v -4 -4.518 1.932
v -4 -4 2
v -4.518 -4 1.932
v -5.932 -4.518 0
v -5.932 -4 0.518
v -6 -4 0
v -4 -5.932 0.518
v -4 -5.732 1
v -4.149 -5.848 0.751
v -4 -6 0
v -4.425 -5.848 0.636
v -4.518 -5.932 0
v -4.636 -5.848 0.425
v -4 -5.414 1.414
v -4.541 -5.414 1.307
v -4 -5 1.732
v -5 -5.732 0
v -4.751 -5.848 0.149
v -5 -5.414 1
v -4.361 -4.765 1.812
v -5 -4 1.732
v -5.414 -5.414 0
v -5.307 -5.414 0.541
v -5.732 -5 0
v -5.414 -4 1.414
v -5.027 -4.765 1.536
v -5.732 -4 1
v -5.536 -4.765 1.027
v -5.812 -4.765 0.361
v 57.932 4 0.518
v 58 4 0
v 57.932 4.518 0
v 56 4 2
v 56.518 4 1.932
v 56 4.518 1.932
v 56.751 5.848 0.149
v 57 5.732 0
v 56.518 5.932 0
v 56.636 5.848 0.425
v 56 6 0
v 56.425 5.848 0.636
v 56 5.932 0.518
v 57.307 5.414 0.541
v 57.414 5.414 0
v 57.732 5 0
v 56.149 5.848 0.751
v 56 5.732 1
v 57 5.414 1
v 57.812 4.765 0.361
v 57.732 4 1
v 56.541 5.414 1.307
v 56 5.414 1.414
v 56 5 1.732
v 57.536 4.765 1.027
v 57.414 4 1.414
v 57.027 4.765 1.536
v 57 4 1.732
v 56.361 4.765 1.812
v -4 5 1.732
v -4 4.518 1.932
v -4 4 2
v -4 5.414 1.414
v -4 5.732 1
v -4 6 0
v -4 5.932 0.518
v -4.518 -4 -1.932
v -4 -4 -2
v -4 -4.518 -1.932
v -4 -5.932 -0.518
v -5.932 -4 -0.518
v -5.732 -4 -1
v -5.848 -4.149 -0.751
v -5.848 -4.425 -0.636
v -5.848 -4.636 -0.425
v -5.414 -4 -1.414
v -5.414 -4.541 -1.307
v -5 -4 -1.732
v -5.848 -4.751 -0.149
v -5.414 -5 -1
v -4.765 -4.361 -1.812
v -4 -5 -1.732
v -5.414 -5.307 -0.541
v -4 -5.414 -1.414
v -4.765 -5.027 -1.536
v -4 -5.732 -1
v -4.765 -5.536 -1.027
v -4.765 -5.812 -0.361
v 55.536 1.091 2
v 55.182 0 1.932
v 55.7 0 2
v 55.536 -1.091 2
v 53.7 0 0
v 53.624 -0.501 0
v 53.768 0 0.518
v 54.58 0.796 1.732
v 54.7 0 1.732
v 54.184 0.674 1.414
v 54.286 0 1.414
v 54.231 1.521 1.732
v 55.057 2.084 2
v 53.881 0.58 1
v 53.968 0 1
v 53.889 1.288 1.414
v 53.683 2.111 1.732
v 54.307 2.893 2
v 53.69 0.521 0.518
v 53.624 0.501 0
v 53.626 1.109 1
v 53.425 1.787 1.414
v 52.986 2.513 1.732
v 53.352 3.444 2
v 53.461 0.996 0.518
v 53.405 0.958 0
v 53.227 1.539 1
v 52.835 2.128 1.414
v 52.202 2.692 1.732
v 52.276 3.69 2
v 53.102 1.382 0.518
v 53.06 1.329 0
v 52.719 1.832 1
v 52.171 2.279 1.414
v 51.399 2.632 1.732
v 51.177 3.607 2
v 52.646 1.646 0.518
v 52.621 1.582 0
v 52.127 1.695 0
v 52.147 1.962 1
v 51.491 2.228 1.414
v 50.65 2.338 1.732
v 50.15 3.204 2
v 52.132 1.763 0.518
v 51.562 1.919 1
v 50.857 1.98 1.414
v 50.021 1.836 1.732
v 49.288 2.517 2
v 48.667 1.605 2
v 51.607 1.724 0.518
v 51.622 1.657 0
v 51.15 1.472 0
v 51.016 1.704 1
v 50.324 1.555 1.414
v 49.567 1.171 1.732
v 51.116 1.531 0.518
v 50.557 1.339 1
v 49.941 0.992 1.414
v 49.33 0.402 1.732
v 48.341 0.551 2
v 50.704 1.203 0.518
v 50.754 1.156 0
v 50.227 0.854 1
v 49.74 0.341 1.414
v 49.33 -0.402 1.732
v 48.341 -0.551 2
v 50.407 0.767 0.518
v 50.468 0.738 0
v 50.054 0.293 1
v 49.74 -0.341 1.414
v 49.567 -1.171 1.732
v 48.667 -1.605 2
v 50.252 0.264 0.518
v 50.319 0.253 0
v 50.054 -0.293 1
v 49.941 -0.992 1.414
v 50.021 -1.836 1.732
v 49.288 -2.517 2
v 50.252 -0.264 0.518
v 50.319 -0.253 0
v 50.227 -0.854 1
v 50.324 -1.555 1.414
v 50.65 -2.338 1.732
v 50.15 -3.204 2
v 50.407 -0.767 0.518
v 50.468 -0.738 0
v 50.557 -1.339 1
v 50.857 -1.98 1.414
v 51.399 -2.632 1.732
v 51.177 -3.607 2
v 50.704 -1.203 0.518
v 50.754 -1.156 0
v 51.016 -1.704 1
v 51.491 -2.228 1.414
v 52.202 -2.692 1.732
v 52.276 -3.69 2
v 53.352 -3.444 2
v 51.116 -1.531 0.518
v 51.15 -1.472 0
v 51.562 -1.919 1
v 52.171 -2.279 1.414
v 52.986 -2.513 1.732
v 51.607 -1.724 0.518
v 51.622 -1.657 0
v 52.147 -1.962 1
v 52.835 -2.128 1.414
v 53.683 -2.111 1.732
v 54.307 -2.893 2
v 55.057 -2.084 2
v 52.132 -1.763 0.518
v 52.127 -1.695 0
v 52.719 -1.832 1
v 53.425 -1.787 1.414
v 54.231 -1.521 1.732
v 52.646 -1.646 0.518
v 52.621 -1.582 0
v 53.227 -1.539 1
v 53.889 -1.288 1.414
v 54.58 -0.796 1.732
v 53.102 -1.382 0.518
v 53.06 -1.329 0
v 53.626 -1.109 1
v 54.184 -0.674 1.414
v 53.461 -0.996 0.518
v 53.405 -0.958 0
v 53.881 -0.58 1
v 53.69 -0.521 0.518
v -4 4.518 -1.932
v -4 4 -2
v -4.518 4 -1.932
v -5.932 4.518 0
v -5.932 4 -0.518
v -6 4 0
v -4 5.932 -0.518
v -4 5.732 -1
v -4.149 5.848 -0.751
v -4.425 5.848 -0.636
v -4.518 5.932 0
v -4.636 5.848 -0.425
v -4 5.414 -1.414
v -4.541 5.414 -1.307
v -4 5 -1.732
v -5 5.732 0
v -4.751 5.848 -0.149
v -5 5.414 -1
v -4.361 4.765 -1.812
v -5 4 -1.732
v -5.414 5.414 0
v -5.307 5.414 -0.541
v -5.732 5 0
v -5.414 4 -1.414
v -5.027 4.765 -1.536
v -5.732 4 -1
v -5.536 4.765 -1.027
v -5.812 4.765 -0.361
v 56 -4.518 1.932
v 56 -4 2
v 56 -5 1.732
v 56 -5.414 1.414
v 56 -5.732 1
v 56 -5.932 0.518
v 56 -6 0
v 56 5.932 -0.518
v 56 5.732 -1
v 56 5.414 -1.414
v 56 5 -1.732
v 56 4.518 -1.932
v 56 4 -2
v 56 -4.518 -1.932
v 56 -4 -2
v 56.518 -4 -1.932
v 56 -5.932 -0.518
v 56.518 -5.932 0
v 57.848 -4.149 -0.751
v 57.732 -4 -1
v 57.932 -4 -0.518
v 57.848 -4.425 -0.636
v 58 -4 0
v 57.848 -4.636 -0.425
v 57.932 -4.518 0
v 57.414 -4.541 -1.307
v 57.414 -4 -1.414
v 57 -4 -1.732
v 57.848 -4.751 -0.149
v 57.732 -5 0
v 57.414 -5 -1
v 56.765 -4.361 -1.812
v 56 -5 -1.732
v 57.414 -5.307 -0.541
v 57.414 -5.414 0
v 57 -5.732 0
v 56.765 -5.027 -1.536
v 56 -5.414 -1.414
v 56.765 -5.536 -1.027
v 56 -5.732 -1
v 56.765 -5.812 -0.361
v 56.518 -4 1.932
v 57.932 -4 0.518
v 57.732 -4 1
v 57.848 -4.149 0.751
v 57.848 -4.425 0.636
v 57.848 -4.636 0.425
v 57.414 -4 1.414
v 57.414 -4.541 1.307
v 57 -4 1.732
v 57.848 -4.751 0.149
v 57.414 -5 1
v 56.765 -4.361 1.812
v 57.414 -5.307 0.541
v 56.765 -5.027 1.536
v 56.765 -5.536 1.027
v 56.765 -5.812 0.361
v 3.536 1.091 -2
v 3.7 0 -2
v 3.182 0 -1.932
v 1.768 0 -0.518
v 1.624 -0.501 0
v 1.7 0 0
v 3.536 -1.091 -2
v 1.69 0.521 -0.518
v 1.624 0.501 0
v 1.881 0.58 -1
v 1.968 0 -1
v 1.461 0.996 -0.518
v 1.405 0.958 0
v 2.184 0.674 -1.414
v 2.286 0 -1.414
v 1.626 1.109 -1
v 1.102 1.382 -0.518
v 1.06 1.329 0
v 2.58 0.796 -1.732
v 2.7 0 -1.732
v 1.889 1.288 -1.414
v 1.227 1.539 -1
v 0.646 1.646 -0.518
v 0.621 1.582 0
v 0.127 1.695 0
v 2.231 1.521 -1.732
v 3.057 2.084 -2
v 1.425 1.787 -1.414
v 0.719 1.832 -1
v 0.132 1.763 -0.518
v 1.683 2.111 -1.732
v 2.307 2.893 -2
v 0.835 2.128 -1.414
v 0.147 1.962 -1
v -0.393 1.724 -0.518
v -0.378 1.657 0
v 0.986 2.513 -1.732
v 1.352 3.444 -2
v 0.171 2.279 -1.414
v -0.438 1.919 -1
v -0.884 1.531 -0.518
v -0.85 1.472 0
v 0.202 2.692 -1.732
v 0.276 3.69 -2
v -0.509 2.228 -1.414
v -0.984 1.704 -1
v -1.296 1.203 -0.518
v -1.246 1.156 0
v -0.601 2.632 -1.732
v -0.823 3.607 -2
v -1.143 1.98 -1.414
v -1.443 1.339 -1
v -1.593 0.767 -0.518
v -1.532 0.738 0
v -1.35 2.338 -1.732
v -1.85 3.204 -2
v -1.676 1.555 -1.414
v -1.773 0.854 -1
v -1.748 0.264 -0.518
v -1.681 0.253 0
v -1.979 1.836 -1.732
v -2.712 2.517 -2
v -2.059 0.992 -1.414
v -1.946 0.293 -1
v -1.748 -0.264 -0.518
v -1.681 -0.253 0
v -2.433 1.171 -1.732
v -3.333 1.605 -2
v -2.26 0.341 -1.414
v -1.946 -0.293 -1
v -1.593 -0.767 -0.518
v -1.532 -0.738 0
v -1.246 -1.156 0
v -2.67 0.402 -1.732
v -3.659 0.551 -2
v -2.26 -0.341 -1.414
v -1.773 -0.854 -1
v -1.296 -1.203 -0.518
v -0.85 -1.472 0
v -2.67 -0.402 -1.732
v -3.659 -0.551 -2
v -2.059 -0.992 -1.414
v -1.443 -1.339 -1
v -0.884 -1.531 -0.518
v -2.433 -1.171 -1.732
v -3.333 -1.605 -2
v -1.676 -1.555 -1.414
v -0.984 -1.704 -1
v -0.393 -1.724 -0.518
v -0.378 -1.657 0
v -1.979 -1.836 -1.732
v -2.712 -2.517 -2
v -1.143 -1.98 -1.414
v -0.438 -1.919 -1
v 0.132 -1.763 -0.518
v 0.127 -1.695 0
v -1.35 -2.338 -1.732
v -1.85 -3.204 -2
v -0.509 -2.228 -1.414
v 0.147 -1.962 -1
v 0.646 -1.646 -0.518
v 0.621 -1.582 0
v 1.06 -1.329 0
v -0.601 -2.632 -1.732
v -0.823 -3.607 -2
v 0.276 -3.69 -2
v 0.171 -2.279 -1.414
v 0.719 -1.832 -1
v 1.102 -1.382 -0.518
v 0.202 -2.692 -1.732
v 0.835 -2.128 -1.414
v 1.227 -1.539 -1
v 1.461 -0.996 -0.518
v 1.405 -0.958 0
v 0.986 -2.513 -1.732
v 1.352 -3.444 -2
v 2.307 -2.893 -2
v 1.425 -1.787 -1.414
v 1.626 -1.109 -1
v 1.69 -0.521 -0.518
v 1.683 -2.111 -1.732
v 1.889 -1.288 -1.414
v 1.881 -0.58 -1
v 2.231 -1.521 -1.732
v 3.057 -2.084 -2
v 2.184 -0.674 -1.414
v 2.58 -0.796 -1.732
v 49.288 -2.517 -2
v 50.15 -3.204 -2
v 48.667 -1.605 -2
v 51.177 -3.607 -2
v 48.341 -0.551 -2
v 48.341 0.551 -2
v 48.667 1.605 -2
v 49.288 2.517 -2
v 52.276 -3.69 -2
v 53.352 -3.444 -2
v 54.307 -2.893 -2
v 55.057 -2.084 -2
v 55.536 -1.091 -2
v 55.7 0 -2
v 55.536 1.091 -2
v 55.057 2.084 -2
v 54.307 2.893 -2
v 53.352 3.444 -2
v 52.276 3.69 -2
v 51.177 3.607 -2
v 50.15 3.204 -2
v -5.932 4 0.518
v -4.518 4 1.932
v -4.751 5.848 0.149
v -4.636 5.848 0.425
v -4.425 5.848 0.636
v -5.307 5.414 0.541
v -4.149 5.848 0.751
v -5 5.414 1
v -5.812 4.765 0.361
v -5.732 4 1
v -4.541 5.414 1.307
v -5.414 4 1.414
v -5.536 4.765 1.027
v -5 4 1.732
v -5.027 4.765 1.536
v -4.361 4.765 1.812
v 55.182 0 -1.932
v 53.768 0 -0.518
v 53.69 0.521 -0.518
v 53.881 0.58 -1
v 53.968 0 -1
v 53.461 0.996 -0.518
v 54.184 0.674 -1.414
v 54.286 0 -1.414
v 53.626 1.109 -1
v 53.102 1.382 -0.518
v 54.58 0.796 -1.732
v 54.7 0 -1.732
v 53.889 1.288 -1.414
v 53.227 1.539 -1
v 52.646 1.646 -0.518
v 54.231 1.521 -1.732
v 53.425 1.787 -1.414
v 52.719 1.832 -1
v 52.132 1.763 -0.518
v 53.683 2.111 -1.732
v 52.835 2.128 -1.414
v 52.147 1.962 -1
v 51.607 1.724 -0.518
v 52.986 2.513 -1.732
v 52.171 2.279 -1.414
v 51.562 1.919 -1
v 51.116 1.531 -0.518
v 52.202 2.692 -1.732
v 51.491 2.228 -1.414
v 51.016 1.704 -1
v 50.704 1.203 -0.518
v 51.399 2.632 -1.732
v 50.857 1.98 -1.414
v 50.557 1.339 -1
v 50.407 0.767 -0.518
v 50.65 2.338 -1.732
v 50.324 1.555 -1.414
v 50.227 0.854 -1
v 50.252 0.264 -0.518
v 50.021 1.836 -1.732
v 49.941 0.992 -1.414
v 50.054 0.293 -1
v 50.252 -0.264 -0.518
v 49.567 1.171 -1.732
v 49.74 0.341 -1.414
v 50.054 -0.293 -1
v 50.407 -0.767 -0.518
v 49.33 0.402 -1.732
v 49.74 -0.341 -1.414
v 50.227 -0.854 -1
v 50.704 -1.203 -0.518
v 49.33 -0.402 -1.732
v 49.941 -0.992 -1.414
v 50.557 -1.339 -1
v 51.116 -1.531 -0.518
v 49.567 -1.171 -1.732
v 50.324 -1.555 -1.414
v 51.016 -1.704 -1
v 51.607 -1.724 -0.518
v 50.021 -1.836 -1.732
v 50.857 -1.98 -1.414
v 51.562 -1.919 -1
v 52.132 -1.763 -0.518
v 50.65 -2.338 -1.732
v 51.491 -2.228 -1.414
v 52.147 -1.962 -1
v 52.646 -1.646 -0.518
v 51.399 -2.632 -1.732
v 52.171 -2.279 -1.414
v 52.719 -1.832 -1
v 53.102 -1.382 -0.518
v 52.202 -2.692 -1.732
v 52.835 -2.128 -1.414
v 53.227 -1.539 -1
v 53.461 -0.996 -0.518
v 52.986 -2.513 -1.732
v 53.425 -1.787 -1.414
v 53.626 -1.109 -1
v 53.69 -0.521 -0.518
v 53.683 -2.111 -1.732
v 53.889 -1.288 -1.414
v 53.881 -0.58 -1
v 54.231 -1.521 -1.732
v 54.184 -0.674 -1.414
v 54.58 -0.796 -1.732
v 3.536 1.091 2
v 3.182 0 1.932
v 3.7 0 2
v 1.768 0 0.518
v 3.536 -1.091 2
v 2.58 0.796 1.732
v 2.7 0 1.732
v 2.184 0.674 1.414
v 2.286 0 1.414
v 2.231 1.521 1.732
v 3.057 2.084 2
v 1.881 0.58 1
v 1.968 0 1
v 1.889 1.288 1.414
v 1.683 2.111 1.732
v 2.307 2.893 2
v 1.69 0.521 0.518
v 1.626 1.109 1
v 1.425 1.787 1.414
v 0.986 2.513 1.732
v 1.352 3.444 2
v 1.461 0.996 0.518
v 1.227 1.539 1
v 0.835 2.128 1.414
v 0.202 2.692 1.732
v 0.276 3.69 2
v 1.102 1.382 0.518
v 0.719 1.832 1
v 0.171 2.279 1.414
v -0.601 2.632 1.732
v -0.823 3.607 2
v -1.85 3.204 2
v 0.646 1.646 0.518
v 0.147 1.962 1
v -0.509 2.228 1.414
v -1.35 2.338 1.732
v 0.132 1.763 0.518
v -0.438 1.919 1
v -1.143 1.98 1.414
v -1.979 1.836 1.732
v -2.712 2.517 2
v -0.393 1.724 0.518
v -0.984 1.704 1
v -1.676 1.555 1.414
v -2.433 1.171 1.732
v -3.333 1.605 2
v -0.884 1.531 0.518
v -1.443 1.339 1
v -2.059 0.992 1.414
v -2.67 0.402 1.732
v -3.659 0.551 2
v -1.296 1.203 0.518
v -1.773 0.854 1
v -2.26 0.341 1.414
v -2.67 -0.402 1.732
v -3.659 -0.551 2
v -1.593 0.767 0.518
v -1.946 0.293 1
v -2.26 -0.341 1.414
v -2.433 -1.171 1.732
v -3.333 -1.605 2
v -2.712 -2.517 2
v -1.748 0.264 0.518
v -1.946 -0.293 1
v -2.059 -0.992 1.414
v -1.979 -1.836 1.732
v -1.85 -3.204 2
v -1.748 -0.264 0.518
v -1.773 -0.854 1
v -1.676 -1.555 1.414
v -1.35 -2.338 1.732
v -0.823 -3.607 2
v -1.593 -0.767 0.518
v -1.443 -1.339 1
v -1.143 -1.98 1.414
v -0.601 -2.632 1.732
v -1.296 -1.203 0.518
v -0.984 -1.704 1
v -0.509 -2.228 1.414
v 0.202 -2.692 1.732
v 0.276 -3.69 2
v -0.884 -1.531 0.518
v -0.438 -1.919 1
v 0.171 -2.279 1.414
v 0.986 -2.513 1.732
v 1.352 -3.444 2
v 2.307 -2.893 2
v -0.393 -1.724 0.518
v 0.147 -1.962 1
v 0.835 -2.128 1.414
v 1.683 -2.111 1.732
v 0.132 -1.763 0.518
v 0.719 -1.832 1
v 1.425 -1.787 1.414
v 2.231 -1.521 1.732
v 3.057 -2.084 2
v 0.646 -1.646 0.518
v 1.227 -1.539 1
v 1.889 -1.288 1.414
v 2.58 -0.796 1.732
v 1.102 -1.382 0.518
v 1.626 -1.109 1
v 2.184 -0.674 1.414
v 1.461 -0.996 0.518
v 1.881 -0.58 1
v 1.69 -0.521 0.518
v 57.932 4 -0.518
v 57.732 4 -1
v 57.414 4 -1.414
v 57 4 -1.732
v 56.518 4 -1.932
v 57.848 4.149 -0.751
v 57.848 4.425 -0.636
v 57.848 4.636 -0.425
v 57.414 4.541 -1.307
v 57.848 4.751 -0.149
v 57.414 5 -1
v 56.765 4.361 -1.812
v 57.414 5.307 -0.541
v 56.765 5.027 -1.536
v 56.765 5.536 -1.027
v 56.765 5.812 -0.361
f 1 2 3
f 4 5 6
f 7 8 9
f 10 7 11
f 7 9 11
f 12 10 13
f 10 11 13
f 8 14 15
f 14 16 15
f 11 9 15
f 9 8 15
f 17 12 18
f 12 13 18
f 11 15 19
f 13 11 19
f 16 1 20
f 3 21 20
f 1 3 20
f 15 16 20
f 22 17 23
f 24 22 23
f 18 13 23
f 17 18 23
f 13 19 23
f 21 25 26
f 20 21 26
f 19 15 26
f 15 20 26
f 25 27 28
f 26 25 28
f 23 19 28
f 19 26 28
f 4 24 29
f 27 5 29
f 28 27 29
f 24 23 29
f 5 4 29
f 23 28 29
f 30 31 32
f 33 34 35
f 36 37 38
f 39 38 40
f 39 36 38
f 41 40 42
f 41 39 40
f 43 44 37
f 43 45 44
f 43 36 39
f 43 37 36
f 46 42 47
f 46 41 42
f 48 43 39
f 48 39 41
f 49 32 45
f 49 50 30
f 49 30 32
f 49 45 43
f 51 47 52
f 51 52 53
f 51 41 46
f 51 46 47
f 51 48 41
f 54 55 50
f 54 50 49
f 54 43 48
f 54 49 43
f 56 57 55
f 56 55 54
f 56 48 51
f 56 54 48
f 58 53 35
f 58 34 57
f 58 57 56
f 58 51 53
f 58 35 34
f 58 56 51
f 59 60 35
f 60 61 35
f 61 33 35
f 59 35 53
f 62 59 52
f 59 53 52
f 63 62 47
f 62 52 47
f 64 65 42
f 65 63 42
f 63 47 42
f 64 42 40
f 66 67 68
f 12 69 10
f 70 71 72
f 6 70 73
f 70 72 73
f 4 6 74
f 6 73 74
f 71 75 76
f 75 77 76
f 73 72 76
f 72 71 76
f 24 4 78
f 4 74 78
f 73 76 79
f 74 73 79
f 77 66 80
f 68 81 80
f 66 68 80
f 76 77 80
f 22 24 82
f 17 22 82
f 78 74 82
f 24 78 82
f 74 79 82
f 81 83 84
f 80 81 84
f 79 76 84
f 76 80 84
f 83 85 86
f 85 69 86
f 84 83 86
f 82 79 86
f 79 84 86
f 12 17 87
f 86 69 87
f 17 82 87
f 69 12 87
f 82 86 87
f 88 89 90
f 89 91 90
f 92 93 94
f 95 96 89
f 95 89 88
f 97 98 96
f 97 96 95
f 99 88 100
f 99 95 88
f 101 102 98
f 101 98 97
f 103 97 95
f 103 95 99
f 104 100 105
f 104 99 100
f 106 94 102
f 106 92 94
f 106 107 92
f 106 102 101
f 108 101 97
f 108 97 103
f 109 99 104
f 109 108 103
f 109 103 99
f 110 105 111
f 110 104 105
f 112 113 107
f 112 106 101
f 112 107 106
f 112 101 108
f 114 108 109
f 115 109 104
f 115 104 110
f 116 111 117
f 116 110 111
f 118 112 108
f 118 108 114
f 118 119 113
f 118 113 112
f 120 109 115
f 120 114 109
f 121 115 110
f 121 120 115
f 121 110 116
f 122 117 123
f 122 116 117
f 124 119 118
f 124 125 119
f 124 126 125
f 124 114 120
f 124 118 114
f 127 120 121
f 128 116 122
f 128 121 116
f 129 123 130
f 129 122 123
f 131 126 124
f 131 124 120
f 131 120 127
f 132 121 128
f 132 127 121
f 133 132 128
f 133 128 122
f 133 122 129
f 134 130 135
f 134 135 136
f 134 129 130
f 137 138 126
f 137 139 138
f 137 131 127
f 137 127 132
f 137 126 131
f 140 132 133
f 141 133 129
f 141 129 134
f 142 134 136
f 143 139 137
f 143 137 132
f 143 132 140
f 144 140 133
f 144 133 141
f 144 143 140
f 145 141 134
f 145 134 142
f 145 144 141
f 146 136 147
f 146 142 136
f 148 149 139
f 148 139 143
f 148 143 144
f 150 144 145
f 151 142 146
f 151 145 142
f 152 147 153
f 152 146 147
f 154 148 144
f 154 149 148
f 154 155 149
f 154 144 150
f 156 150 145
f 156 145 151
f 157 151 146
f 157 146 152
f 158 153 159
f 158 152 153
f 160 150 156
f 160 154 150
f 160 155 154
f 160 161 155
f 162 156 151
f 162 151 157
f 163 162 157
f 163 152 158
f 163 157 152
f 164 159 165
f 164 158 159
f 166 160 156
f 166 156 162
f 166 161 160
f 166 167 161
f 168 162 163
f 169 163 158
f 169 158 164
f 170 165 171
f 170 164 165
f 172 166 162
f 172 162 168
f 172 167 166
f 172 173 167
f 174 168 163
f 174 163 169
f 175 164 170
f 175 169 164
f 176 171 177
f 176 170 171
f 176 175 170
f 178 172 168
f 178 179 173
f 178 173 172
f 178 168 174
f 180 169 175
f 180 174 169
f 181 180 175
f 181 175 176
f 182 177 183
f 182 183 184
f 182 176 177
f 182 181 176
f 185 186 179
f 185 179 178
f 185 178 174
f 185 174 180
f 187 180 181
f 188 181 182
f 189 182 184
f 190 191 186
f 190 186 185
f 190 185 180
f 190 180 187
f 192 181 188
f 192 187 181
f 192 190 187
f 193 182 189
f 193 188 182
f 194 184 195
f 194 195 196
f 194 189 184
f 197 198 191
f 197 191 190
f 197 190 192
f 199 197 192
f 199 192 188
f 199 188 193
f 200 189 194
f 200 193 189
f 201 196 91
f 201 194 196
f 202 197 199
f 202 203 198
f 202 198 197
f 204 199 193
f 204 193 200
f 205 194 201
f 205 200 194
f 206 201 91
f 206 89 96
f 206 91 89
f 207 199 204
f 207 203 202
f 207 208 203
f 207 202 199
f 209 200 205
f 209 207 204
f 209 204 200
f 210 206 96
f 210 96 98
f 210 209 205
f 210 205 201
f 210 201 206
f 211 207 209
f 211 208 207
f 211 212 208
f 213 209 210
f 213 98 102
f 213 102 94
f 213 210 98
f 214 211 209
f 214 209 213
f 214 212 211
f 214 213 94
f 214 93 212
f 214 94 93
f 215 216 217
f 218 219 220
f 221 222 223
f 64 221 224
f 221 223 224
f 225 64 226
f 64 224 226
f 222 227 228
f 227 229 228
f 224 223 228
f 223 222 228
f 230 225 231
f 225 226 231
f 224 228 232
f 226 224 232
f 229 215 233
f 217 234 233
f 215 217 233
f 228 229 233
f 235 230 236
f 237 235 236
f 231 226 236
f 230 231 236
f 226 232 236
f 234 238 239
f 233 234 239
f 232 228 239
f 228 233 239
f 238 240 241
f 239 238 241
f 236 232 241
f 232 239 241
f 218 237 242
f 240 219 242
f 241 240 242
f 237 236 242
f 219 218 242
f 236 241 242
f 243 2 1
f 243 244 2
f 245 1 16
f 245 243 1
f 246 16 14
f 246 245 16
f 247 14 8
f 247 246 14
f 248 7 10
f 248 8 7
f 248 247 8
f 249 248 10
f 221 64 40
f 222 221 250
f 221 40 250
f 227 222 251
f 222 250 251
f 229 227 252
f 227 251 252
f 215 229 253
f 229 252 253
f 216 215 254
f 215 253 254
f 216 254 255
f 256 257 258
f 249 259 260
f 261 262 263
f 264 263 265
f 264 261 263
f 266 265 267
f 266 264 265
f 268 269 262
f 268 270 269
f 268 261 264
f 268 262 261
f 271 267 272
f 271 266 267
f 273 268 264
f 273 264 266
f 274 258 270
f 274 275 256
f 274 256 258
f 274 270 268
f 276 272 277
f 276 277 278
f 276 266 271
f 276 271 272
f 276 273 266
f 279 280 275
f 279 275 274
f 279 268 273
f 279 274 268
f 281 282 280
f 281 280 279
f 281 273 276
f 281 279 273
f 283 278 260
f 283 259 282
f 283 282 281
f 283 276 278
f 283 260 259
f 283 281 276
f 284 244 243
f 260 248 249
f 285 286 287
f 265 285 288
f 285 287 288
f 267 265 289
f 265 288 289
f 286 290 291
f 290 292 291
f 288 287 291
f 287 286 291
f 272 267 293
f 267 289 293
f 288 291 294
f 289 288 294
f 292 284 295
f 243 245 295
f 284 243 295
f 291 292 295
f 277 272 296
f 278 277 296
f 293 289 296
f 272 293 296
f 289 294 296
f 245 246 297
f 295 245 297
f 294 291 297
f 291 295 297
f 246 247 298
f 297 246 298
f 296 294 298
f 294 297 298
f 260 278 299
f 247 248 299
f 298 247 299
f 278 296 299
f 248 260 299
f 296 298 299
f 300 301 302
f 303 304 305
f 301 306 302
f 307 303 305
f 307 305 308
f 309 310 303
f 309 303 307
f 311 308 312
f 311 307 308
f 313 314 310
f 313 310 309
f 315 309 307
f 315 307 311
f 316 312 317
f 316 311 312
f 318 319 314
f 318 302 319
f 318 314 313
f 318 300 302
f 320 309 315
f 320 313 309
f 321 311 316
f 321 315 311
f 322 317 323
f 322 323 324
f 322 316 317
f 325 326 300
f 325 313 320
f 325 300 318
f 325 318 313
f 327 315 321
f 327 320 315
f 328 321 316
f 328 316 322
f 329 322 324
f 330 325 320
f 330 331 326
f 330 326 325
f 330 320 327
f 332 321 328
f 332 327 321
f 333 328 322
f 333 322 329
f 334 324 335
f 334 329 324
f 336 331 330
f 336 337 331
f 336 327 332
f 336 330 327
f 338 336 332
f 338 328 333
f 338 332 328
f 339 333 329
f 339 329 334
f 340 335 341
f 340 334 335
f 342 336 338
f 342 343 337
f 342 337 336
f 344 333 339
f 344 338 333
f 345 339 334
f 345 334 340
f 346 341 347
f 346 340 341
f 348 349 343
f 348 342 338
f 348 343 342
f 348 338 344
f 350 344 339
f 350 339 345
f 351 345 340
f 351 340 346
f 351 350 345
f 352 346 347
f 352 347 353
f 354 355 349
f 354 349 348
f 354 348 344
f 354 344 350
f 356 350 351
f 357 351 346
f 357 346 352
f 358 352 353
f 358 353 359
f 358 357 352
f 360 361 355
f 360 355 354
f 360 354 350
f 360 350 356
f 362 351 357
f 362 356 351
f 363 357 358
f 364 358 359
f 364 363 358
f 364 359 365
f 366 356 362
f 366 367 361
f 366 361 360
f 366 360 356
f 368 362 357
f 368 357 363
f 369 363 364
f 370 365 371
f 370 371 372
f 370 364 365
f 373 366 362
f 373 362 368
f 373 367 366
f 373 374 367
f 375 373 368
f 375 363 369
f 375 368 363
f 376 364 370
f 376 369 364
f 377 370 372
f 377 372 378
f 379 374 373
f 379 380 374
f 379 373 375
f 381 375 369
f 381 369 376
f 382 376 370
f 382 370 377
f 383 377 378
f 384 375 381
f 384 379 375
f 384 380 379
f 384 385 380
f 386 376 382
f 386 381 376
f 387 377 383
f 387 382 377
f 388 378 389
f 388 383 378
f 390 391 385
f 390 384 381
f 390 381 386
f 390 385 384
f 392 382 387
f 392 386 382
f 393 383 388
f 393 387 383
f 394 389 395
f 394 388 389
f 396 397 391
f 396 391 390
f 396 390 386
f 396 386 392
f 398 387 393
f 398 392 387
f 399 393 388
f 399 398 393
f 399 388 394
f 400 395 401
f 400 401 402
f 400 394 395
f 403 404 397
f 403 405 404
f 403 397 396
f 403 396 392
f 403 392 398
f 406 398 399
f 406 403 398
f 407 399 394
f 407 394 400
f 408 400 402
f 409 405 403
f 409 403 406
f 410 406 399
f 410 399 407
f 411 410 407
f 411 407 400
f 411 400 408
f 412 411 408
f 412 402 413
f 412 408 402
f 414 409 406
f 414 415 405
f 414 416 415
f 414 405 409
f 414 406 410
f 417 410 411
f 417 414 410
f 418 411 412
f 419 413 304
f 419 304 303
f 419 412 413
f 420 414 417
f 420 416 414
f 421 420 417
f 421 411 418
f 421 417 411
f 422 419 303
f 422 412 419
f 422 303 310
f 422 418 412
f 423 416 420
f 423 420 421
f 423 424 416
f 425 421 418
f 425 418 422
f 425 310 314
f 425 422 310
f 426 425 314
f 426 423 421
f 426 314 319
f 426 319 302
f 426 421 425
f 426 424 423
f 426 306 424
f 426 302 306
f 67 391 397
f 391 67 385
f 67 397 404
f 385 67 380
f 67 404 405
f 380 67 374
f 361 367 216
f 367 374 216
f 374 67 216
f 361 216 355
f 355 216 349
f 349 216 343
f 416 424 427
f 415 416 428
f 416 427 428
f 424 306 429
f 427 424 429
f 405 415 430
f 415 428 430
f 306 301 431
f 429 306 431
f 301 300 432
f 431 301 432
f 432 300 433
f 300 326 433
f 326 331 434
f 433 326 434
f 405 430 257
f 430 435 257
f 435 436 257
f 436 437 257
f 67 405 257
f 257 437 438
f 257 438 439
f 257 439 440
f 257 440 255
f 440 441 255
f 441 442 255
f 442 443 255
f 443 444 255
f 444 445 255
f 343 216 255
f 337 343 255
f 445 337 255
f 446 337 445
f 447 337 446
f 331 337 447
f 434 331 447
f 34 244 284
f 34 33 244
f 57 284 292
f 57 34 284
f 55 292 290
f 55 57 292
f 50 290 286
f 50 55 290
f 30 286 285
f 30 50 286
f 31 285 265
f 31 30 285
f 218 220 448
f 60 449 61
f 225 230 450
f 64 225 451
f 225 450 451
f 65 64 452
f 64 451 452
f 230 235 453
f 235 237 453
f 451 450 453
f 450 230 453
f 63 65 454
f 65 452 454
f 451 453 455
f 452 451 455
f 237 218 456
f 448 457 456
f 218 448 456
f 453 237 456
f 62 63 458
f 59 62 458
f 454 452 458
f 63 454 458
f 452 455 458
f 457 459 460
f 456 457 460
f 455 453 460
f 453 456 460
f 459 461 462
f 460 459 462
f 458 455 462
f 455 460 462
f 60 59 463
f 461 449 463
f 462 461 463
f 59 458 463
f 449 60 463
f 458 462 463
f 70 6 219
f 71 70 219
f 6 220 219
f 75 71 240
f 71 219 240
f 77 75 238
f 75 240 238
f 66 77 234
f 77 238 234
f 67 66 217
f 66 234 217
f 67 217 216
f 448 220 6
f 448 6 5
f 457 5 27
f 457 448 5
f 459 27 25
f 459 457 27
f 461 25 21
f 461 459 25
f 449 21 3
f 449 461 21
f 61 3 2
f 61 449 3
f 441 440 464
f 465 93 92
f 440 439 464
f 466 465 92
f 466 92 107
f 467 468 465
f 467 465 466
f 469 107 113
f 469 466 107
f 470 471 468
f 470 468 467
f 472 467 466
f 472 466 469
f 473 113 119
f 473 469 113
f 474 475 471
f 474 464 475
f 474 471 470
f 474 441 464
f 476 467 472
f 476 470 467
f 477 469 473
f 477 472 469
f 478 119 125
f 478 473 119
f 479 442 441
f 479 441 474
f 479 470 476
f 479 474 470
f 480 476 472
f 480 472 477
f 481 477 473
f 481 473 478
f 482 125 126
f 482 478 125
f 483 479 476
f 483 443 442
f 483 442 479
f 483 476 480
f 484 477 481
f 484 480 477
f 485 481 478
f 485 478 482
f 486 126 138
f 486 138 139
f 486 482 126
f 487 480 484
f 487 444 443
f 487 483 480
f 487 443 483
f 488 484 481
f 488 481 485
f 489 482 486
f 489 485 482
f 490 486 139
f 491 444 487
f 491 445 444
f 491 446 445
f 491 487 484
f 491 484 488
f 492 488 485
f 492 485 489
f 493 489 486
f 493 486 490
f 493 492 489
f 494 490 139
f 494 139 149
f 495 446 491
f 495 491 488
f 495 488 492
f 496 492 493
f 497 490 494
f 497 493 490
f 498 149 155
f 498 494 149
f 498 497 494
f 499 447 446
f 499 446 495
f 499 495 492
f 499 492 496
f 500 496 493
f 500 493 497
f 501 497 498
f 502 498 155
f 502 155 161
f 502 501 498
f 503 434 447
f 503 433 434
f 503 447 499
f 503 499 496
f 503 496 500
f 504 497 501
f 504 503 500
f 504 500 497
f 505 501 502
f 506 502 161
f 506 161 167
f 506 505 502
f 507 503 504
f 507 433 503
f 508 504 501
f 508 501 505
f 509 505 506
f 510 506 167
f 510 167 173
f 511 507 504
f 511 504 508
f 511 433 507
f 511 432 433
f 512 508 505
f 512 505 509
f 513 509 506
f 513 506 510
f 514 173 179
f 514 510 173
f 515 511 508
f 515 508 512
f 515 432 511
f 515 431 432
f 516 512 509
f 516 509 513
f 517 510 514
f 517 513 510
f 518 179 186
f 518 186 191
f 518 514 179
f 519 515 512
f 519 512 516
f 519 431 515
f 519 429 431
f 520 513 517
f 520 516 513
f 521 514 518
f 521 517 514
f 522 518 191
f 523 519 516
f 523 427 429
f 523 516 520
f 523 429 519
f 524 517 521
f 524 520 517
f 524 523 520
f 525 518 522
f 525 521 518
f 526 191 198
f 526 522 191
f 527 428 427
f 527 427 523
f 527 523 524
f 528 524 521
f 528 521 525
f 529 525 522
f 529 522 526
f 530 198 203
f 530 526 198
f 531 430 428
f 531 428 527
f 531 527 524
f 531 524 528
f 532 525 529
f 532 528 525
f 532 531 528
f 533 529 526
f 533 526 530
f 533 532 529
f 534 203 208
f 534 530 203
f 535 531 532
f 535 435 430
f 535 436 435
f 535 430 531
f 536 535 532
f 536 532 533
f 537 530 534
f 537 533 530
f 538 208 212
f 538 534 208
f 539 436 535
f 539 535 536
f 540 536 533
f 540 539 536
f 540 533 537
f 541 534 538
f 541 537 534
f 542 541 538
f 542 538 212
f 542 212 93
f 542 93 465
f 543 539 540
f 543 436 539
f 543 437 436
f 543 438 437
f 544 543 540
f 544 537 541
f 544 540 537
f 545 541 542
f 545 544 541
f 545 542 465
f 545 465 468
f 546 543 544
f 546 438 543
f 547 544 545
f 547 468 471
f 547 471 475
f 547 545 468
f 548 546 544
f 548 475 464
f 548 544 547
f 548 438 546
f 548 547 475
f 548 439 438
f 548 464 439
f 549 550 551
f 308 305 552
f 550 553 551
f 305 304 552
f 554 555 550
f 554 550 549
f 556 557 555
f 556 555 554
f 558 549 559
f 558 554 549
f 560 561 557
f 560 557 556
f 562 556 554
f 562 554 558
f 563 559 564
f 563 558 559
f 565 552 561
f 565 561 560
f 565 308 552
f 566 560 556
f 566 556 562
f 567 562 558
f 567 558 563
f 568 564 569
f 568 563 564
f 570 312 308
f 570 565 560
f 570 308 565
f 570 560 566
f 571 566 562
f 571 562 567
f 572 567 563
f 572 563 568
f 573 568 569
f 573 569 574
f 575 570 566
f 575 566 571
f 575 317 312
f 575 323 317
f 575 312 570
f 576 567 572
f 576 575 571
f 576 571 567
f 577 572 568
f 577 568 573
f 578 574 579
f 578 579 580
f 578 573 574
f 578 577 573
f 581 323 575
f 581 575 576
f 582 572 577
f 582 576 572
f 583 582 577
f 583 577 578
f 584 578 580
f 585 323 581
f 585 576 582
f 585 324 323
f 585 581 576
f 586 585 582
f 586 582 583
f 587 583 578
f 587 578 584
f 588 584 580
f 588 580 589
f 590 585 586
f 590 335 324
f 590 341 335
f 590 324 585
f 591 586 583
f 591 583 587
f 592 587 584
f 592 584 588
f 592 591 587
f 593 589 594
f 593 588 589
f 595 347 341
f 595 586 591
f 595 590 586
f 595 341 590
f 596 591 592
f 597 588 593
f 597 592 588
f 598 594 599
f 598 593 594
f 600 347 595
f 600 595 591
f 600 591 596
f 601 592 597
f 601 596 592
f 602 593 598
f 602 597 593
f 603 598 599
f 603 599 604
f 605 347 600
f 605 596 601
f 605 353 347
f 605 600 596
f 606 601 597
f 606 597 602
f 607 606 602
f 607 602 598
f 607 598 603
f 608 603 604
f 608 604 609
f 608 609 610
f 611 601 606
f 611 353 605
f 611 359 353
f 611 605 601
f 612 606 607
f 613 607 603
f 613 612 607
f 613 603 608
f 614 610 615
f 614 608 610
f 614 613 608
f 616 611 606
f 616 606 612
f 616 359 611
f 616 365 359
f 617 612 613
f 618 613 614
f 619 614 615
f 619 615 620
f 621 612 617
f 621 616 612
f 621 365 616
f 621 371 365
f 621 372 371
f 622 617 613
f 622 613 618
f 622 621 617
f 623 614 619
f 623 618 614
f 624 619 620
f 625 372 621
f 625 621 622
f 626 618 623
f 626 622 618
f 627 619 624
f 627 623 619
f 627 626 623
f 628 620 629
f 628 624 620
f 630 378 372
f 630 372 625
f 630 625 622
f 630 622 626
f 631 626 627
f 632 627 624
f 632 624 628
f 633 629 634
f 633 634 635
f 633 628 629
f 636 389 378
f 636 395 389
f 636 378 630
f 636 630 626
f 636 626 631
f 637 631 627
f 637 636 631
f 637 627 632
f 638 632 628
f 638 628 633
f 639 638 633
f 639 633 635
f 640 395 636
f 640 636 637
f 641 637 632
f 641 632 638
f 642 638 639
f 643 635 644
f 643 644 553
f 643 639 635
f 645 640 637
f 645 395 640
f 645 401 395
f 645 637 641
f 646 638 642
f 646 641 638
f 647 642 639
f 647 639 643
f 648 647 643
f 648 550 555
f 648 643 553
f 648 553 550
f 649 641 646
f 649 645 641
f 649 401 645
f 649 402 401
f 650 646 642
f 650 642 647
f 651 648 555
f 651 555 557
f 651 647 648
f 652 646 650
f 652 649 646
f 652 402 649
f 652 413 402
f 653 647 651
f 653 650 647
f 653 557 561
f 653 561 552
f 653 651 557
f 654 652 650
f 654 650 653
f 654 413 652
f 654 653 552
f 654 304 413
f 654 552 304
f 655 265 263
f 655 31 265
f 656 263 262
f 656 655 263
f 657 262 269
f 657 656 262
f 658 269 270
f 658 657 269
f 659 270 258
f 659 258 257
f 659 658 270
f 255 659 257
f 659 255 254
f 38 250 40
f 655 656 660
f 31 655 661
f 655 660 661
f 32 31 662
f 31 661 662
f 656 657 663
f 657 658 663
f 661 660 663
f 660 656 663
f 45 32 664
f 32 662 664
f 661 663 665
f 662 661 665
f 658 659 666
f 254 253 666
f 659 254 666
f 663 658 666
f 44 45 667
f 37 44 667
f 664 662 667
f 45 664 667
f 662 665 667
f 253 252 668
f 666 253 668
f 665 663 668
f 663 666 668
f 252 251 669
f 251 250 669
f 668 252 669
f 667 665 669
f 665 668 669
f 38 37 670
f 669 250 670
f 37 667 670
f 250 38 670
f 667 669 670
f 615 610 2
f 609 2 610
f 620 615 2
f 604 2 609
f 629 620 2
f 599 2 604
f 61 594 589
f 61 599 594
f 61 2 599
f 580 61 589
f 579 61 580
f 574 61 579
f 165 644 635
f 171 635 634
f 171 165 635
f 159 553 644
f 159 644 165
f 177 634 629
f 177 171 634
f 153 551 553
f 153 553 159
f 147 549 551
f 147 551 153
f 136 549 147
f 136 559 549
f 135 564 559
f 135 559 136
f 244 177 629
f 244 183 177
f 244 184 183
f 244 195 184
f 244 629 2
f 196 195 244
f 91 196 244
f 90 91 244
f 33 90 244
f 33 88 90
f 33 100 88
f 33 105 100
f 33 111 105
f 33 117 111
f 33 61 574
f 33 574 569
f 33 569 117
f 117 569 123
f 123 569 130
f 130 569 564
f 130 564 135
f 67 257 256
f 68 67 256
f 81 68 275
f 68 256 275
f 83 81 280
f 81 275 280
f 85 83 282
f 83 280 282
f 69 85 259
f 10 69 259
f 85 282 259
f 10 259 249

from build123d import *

# Parameters (mm, degrees)
SKETCH_1_W      = 64
SKETCH_1_H      = 12
SKETCH_1_R      = 1.7
EXTRUDE_1_DEPTH = 2
FILLET_1_R      = 2


with BuildPart() as part:
    # 草图1 → 凸台-拉伸1 (new, symmetric)
    with BuildSketch(Plane.XY):
        with Locations((26, 0)):
            Rectangle(SKETCH_1_W, SKETCH_1_H)
        Circle(SKETCH_1_R, mode=Mode.SUBTRACT)
        with Locations((52, 0)):
            Circle(SKETCH_1_R, mode=Mode.SUBTRACT)
    extrude(amount=EXTRUDE_1_DEPTH, both=True)

    # 圆角1
    fillet_1_edges = [part.edges().sort_by_distance(p)[0] for p in [
        (-1.7, 0, -2),
        (-1.7, 0, 2),
        (-6, 0, 2),
        (50.3, 0, -2),
        (50.3, 0, 2),
        (26, -6, 2),
        (58, 0, 2),
        (26, -6, -2),
        (-6, 0, -2),
        (26, 6, -2),
        (58, 0, -2),
        (58, -6, 0),
        (-6, -6, 0),
        (-6, 6, 0),
        (58, 6, 0),
        (26, 6, 2),
    ]]
    fillet(fillet_1_edges, radius=FILLET_1_R - 0.0001)  # a hair under: the kernel refuses the full size


solid = part.part
